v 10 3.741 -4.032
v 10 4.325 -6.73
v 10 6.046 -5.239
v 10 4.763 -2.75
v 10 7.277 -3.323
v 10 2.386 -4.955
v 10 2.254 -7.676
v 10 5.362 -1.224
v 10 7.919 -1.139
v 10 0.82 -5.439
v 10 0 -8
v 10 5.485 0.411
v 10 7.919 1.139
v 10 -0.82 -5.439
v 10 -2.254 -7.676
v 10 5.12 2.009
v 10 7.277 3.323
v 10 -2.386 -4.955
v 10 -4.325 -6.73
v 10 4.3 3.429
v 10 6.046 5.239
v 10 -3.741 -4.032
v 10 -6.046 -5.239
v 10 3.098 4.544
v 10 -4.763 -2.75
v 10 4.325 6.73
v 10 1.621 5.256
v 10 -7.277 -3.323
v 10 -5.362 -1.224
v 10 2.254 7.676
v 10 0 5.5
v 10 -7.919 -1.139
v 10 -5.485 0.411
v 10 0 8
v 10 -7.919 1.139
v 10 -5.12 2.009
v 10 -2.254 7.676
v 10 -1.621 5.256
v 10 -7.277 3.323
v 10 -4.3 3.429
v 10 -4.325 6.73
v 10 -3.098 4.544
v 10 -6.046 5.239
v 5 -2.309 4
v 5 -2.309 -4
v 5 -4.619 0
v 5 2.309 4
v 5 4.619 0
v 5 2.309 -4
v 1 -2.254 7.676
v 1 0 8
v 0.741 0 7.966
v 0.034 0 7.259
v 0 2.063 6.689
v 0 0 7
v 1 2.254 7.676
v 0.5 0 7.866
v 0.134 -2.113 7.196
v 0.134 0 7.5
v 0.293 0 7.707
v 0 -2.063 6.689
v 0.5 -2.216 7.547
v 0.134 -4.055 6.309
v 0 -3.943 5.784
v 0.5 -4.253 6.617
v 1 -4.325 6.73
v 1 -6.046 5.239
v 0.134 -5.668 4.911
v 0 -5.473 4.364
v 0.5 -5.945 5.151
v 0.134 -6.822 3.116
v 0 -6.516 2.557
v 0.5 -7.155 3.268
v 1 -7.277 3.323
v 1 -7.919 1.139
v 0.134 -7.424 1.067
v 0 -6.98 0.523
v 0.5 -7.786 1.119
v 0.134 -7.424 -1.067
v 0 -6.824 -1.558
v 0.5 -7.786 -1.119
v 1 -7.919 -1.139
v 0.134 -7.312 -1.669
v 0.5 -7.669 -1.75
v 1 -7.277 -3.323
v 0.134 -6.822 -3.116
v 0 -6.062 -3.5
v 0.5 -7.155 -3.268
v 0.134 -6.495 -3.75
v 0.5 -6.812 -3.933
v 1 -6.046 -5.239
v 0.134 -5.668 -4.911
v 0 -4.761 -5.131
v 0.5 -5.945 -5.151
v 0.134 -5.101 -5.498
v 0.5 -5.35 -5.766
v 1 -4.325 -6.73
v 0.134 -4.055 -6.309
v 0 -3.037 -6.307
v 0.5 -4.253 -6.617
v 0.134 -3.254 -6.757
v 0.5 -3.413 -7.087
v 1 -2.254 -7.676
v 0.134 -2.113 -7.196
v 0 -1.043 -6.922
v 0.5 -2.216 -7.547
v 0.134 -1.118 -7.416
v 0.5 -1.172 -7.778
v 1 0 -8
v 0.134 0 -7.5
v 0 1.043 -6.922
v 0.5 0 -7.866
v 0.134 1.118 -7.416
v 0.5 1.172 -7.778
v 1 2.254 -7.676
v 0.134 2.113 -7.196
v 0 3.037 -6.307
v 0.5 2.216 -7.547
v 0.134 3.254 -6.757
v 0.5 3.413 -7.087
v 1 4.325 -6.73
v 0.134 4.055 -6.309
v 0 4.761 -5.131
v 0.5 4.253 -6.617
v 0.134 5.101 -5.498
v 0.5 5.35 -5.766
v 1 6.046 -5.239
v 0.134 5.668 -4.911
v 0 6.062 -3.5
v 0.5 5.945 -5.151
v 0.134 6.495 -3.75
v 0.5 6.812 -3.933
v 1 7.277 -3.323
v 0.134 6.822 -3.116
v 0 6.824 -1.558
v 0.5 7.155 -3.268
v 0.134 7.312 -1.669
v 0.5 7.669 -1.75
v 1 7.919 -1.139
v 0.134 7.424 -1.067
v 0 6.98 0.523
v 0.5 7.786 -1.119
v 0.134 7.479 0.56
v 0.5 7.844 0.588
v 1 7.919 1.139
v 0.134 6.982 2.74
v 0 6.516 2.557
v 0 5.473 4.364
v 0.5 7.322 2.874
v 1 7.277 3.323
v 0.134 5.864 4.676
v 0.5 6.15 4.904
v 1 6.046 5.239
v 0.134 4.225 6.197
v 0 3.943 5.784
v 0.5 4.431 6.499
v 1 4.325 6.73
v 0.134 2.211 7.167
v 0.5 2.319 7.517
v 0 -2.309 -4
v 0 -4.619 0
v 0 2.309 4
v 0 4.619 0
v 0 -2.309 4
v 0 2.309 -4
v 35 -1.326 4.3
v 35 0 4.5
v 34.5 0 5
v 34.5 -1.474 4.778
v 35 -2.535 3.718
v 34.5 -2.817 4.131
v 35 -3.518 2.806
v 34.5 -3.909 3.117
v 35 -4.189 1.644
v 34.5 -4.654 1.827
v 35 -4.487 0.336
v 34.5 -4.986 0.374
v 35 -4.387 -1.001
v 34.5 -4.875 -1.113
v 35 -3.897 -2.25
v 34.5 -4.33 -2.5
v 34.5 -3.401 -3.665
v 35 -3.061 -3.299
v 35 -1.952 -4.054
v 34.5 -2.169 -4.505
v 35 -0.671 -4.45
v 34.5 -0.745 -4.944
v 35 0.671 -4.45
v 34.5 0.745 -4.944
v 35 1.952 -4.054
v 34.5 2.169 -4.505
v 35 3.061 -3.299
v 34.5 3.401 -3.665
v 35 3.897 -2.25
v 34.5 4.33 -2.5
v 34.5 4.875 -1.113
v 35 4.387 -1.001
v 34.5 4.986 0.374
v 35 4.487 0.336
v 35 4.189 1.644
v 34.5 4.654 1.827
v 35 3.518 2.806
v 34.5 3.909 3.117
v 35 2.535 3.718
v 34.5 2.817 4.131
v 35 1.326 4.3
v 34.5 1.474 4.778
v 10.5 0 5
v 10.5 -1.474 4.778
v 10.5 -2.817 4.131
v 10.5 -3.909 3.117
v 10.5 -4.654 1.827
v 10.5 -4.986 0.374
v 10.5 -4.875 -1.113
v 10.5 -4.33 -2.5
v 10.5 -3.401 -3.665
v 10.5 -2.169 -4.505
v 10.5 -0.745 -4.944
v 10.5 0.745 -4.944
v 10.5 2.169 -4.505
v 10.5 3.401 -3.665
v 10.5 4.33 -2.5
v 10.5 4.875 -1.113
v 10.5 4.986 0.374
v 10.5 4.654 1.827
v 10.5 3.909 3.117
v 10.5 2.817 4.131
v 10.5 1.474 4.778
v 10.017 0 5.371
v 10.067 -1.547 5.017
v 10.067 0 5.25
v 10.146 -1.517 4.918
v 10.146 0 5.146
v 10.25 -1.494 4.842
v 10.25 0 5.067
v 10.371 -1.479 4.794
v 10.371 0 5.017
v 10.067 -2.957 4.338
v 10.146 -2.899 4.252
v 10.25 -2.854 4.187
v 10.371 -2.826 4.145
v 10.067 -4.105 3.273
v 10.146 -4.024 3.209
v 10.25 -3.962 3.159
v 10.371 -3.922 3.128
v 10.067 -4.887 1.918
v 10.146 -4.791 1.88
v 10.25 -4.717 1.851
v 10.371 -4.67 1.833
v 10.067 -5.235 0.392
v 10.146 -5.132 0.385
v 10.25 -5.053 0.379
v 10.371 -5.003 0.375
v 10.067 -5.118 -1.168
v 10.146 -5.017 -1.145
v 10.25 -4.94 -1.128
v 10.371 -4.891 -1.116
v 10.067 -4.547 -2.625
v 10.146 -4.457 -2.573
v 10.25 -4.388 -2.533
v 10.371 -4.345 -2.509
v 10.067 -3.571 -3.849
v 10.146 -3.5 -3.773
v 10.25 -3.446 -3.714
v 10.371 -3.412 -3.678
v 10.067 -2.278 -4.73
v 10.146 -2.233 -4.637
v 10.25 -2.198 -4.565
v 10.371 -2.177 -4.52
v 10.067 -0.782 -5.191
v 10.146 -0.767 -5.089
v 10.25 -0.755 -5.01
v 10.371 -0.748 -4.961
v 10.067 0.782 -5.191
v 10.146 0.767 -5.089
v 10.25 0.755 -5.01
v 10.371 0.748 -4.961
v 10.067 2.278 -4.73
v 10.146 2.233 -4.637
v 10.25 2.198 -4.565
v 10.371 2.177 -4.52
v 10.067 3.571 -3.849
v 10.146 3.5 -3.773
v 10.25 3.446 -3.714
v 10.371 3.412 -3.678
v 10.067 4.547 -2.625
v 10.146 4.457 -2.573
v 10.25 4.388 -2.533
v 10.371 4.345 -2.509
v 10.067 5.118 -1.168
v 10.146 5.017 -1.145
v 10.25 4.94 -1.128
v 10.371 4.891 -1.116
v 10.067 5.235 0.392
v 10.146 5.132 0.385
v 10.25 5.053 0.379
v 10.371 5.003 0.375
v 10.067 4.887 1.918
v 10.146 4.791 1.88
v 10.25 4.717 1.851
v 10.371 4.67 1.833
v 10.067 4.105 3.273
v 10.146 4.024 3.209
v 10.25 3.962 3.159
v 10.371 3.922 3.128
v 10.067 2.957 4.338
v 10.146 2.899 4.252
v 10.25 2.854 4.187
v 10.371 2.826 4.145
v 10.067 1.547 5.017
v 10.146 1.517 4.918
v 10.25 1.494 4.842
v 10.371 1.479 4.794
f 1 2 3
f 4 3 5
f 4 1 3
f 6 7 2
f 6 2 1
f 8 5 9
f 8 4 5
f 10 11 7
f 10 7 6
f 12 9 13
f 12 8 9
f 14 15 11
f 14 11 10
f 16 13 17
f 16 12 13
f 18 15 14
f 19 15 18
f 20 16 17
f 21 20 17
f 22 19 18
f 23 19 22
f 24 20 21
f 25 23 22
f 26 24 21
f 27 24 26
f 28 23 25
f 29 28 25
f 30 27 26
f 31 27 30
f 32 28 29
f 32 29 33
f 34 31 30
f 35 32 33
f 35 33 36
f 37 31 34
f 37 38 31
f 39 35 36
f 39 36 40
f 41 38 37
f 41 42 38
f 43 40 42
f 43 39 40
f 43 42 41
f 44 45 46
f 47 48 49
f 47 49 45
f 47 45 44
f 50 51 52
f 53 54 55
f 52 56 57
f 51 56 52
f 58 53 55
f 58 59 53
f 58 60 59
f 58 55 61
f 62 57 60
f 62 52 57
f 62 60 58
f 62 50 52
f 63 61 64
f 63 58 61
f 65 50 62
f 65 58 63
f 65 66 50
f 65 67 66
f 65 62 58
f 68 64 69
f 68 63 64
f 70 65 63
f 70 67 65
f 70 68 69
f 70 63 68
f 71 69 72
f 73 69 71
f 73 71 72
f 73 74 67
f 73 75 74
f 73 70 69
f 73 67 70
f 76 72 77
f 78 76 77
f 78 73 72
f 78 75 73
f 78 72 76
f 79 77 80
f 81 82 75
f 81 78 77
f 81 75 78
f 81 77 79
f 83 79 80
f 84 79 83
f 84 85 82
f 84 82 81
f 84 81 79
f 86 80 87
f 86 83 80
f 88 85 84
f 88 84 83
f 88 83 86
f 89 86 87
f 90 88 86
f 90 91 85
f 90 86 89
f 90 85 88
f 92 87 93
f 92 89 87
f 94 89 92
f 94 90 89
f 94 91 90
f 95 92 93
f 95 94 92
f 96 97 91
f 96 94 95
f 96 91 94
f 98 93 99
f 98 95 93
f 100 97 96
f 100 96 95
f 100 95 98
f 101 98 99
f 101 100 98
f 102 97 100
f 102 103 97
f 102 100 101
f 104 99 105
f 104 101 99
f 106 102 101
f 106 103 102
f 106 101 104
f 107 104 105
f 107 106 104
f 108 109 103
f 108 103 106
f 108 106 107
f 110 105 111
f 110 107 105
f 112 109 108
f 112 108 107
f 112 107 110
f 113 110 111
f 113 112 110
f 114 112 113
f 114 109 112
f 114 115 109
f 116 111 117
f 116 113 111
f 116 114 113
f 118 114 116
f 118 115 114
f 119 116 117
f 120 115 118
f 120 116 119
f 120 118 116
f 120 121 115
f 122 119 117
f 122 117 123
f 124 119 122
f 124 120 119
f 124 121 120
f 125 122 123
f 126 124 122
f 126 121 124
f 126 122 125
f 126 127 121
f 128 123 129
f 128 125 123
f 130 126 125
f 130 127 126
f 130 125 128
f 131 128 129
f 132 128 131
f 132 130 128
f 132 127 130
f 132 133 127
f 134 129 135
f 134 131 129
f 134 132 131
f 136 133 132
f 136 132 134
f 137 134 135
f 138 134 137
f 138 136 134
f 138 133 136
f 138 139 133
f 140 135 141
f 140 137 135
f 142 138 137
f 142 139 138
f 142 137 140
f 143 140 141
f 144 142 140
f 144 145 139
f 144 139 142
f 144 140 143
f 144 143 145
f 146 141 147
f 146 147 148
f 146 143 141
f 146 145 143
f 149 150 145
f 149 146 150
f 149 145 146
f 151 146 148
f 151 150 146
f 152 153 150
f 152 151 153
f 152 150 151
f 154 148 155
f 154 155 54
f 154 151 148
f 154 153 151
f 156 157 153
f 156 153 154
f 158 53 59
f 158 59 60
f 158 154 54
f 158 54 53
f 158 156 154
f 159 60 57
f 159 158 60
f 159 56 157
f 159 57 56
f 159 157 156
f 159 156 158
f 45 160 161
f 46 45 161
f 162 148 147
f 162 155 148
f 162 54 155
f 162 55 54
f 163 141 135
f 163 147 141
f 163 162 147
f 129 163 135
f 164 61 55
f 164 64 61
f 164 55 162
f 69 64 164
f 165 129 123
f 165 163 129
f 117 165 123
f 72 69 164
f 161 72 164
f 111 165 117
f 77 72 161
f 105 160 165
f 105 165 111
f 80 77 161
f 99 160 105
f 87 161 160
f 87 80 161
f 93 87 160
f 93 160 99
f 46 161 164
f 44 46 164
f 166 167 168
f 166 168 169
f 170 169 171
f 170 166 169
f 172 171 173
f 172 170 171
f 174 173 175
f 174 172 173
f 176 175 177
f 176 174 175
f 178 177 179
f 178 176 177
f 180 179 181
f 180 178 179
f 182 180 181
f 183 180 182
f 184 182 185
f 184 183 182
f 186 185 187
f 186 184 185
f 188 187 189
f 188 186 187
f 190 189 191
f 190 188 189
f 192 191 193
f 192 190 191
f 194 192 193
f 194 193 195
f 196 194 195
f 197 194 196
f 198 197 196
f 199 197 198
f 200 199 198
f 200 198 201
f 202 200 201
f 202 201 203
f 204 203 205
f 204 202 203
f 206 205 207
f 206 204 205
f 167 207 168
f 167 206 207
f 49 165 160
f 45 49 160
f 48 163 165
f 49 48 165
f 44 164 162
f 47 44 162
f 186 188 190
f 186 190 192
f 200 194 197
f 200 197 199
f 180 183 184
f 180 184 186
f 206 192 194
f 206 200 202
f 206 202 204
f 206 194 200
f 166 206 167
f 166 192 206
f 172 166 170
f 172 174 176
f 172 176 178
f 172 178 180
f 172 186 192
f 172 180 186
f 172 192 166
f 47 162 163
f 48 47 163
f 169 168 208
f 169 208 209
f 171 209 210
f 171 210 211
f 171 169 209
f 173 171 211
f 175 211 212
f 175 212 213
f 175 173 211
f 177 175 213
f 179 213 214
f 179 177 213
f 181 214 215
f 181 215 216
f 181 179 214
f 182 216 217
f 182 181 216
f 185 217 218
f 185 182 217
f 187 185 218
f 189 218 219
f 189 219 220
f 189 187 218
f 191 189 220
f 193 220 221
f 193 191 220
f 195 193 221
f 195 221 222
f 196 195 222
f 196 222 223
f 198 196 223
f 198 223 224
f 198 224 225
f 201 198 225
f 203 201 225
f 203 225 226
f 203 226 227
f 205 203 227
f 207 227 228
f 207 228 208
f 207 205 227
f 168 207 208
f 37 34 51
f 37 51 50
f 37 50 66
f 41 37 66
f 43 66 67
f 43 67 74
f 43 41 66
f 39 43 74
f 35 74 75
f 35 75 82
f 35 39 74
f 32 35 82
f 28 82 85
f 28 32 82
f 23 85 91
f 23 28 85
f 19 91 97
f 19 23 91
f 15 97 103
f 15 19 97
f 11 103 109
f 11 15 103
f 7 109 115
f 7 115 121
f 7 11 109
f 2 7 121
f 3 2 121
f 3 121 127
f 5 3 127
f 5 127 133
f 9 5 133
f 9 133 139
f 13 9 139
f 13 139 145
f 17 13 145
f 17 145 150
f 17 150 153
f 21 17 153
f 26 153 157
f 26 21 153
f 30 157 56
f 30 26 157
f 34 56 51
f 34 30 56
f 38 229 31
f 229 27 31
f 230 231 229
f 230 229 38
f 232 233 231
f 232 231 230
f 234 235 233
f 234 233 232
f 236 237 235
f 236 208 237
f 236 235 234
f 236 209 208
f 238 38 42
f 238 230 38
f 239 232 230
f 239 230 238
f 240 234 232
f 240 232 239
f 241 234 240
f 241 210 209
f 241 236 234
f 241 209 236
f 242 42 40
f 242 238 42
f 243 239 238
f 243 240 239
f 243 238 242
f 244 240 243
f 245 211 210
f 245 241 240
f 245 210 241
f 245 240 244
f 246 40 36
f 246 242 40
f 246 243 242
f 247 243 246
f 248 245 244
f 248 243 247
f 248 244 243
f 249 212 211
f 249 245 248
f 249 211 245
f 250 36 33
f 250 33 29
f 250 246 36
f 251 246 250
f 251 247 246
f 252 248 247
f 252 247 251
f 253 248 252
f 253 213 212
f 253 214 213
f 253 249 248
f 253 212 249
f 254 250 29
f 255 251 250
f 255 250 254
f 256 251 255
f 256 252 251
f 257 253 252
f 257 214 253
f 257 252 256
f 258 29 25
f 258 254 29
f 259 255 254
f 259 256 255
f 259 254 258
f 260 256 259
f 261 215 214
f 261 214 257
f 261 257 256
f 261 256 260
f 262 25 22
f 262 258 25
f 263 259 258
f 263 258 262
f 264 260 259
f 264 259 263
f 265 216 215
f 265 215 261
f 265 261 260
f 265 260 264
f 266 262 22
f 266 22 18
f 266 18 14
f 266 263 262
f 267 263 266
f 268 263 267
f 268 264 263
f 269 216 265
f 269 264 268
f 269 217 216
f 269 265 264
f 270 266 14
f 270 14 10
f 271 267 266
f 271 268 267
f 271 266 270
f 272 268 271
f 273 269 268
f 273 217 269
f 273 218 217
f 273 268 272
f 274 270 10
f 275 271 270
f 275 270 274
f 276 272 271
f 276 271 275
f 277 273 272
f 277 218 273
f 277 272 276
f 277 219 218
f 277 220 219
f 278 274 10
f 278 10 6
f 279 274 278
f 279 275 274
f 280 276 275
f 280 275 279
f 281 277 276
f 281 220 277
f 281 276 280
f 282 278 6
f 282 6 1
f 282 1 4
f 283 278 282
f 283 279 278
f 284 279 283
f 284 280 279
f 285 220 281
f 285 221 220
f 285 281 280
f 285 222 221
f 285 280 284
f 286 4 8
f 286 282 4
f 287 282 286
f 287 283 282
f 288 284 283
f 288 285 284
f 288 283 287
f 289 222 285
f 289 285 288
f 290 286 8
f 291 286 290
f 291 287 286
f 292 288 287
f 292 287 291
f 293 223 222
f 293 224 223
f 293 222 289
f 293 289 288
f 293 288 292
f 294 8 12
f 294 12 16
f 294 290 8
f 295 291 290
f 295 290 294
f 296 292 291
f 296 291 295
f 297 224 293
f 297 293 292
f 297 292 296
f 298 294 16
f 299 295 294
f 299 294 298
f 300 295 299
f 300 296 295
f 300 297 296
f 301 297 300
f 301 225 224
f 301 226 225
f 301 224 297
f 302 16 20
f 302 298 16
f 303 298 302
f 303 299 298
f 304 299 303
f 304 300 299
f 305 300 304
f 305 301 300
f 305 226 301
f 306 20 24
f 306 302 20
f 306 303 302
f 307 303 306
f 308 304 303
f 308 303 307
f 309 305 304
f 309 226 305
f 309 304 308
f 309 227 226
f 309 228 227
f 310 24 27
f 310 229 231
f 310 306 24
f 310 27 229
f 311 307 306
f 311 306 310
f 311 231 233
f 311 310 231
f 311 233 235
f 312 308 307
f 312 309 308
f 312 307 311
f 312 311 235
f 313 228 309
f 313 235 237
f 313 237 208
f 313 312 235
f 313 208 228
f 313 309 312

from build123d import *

# Parameters (mm, degrees)
CORTAR_EXTRUIR1_DEPTH = 5
REDONDEO1_R           = 1
REDONDEO2_R           = 0.5
CHAFL_N1_SIZE         = 0.5


with BuildPart() as part:
    # Croquis1 → Revolución1 (revolve)
    with BuildSketch(Plane.XY, mode=Mode.PRIVATE) as revoluci_n1_sk:
        Polygon((0, 0), (0, 8), (10, 8), (10, 5), (35, 5), (35, 0), align=None)
    revolve(revoluci_n1_sk.sketch.rotate(Axis((0, 0, 0), (1, 0, 0)), 90), axis=Axis((0, 0, 0), (1, 0, 0)))

    # Croquis2 → Cortar-Extruir1 (cut)
    with BuildSketch(Plane.ZY):
        Polygon((0, 4.618802154), (-4, 2.309401077), (-4, -2.309401077), (0, -4.618802154), (4, -2.309401077), (4, 2.309401077), align=None)
    extrude(amount=-CORTAR_EXTRUIR1_DEPTH, mode=Mode.SUBTRACT)

    # Redondeo1
    redondeo1_edges = [part.edges().sort_by_distance(p)[0] for p in [
        (0, 0, -8),
    ]]
    fillet(redondeo1_edges, radius=REDONDEO1_R)

    # Redondeo2
    redondeo2_edges = [part.edges().sort_by_distance(p)[0] for p in [
        (10, 0, -5),
    ]]
    fillet(redondeo2_edges, radius=REDONDEO2_R)

    # Chaflán1
    chafl_n1_edges = [part.edges().sort_by_distance(p)[0] for p in [
        (35, 0, -5),
    ]]
    chamfer(chafl_n1_edges, length=CHAFL_N1_SIZE)


solid = part.part
